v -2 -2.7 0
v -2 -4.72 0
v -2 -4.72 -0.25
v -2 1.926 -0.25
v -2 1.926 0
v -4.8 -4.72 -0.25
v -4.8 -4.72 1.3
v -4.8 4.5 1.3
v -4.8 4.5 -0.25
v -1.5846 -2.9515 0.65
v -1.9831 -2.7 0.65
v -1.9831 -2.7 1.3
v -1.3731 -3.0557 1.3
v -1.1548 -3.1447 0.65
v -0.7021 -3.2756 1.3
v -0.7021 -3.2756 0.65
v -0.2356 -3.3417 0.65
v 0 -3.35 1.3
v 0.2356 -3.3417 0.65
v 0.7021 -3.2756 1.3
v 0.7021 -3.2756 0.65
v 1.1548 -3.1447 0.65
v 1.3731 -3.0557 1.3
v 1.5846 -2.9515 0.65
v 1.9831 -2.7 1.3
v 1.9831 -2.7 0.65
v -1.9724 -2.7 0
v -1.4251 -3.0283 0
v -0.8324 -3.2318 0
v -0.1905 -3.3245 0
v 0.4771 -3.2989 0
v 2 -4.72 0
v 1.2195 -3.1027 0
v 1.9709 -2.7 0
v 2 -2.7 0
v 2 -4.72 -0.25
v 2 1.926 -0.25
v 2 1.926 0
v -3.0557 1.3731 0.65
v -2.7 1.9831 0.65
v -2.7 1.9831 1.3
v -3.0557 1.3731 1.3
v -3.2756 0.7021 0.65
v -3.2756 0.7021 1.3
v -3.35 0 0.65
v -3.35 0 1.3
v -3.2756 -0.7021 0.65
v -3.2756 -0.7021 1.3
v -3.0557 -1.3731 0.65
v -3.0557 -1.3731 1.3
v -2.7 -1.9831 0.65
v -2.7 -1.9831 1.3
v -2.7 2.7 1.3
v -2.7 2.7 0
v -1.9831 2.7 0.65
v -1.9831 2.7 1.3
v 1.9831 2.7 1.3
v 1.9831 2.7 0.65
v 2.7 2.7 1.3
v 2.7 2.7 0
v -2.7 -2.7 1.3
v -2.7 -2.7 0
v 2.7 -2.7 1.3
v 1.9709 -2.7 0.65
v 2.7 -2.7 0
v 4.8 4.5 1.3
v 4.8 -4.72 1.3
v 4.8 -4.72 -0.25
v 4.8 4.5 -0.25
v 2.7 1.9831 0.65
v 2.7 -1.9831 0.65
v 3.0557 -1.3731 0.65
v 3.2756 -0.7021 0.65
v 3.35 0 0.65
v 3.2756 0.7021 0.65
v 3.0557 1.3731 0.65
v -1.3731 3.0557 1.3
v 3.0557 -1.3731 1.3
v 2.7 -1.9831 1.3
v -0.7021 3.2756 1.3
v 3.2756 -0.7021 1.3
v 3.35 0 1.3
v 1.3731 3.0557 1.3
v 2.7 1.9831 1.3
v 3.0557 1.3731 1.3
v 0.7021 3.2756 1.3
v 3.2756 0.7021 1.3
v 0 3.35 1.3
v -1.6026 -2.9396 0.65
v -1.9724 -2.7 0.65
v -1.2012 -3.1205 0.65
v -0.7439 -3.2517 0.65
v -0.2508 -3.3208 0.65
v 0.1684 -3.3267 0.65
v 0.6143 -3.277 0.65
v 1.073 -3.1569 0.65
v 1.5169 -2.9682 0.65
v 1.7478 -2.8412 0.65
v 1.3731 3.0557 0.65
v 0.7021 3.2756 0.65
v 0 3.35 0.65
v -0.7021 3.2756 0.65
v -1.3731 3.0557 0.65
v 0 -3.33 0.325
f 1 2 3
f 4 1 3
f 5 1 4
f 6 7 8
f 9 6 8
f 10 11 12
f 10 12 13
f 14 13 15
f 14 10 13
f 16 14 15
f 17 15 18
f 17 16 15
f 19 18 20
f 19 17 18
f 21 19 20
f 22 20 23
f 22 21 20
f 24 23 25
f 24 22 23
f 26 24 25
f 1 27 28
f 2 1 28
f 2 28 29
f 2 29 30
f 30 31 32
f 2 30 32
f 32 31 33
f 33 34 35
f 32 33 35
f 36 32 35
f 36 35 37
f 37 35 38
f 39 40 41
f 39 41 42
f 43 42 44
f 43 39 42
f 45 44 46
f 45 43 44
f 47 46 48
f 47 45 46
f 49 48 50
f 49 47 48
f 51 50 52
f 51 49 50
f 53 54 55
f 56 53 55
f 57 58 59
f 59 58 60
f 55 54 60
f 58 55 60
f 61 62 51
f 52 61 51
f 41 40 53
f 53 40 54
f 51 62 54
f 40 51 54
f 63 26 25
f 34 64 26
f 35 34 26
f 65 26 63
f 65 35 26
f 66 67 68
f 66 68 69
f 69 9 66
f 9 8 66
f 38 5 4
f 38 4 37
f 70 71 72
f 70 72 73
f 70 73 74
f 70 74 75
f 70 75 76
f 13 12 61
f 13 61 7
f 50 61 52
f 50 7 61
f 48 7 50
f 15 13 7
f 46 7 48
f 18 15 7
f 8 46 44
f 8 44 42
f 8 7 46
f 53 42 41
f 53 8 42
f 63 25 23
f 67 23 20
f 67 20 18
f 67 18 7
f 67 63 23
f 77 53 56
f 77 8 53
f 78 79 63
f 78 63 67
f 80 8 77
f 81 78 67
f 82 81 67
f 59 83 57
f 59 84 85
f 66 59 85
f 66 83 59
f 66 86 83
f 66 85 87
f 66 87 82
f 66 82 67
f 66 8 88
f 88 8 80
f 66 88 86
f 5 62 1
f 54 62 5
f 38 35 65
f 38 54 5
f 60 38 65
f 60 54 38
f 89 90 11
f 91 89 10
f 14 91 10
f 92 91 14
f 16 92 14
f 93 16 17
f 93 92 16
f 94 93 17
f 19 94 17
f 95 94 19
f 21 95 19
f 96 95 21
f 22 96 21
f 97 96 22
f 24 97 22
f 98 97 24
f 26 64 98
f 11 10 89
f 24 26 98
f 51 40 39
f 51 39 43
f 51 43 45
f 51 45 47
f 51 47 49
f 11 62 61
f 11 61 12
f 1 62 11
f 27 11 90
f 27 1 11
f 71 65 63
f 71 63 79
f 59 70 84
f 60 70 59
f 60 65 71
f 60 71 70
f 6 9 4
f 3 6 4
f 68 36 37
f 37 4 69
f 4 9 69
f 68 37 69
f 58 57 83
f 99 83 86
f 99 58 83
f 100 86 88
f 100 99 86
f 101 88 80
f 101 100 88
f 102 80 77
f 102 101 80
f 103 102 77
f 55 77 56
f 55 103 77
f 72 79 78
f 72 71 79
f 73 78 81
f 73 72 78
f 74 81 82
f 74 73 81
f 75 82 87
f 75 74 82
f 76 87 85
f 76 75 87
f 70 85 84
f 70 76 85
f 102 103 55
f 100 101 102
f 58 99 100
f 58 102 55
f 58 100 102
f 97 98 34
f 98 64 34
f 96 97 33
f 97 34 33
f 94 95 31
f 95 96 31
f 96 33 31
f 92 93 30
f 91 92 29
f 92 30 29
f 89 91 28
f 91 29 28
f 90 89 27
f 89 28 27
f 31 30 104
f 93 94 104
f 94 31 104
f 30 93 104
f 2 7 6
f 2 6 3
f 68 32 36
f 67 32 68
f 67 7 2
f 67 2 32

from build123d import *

# Parameters (mm, degrees)
PAD009_DEPTH      = 10
PAD009_DEPTH_BACK = 10
SKETCH_W          = 4
SKETCH_H          = 7.426
PAD008_DEPTH      = 1
SKETCH007_R       = 3.35
PAD007_DEPTH      = 1.5
SKETCH006_W       = 5.4
SKETCH006_H       = 5.4
PAD006_DEPTH      = 5
SKETCH001_W       = 9.6
SKETCH001_H       = 9.22
PAD_DEPTH         = 1.3
PAD_DEPTH_BACK    = 0.25


with BuildPart() as bottom_cut_avoid_thin_bridge:
    # Sketch008 → Pad009 (new body, two sides)
    with BuildSketch(Plane.XY) as pad009_sk:
        with BuildLine():
            Line((-1.982914, -2.691867), (1.982914, -2.691867))
            add(Edge.make_bspline(
                [(1.982914, -2.691867), (1.306801, -3.14996), (0.04804, -3.514381), (-1.402881, -3.141278), (-1.982914, -2.691867)],
                knots=[0, 0, 0, 0, 0.5, 1, 1, 1, 1], degree=3))
        make_face()
    extrude(amount=PAD009_DEPTH)
    extrude(pad009_sk.sketch, amount=-PAD009_DEPTH_BACK)


with BuildPart() as sensor_entrance_channel_cut:
    # Sketch → Pad008 (new body)
    with BuildSketch(Plane.XY):
        with Locations((0, -1.787)):
            Rectangle(SKETCH_W, SKETCH_H)
    extrude(amount=-PAD008_DEPTH)


with BuildPart() as o_ring_cutout:
    # Sketch007 → Pad007 (new body)
    with BuildSketch(Plane.XY):
        Circle(SKETCH007_R)
    extrude(amount=PAD007_DEPTH)


with BuildPart() as o_ring_cutout_1:
    # Body007 placement: moved
    add(o_ring_cutout.part.moved(Location((0, 0, 0.65))))


with BuildPart() as glass_cutout:
    # Sketch006 → Pad006 (new body)
    with BuildSketch(Plane.XY):
        Rectangle(SKETCH006_W, SKETCH006_H)
    extrude(amount=PAD006_DEPTH)


with BuildPart() as cut003:
    # Sketch001 → Pad (new body, two sides)
    with BuildSketch(Plane.XY) as pad_sk:
        with Locations((0, -0.61)):
            Rectangle(SKETCH001_W, SKETCH001_H)
    extrude(amount=PAD_DEPTH)
    extrude(pad_sk.sketch, amount=-PAD_DEPTH_BACK)


with BuildPart() as cut003_1:
    # Body001 placement: moved
    add(cut003.part.moved(Location((0, 0.5, 0))))

    # Cut: cut Glass _cutout
    add(glass_cutout.part, mode=Mode.SUBTRACT)

    # Cut001: cut O-ring_Cutout
    add(o_ring_cutout_1.part, mode=Mode.SUBTRACT)

    # Cut002: cut sensor entrance channel cut
    add(sensor_entrance_channel_cut.part, mode=Mode.SUBTRACT)

    # Cut003: cut Bottom_Cut_avoid_thin_bridge
    add(bottom_cut_avoid_thin_bridge.part, mode=Mode.SUBTRACT)


solid = cut003_1.part
